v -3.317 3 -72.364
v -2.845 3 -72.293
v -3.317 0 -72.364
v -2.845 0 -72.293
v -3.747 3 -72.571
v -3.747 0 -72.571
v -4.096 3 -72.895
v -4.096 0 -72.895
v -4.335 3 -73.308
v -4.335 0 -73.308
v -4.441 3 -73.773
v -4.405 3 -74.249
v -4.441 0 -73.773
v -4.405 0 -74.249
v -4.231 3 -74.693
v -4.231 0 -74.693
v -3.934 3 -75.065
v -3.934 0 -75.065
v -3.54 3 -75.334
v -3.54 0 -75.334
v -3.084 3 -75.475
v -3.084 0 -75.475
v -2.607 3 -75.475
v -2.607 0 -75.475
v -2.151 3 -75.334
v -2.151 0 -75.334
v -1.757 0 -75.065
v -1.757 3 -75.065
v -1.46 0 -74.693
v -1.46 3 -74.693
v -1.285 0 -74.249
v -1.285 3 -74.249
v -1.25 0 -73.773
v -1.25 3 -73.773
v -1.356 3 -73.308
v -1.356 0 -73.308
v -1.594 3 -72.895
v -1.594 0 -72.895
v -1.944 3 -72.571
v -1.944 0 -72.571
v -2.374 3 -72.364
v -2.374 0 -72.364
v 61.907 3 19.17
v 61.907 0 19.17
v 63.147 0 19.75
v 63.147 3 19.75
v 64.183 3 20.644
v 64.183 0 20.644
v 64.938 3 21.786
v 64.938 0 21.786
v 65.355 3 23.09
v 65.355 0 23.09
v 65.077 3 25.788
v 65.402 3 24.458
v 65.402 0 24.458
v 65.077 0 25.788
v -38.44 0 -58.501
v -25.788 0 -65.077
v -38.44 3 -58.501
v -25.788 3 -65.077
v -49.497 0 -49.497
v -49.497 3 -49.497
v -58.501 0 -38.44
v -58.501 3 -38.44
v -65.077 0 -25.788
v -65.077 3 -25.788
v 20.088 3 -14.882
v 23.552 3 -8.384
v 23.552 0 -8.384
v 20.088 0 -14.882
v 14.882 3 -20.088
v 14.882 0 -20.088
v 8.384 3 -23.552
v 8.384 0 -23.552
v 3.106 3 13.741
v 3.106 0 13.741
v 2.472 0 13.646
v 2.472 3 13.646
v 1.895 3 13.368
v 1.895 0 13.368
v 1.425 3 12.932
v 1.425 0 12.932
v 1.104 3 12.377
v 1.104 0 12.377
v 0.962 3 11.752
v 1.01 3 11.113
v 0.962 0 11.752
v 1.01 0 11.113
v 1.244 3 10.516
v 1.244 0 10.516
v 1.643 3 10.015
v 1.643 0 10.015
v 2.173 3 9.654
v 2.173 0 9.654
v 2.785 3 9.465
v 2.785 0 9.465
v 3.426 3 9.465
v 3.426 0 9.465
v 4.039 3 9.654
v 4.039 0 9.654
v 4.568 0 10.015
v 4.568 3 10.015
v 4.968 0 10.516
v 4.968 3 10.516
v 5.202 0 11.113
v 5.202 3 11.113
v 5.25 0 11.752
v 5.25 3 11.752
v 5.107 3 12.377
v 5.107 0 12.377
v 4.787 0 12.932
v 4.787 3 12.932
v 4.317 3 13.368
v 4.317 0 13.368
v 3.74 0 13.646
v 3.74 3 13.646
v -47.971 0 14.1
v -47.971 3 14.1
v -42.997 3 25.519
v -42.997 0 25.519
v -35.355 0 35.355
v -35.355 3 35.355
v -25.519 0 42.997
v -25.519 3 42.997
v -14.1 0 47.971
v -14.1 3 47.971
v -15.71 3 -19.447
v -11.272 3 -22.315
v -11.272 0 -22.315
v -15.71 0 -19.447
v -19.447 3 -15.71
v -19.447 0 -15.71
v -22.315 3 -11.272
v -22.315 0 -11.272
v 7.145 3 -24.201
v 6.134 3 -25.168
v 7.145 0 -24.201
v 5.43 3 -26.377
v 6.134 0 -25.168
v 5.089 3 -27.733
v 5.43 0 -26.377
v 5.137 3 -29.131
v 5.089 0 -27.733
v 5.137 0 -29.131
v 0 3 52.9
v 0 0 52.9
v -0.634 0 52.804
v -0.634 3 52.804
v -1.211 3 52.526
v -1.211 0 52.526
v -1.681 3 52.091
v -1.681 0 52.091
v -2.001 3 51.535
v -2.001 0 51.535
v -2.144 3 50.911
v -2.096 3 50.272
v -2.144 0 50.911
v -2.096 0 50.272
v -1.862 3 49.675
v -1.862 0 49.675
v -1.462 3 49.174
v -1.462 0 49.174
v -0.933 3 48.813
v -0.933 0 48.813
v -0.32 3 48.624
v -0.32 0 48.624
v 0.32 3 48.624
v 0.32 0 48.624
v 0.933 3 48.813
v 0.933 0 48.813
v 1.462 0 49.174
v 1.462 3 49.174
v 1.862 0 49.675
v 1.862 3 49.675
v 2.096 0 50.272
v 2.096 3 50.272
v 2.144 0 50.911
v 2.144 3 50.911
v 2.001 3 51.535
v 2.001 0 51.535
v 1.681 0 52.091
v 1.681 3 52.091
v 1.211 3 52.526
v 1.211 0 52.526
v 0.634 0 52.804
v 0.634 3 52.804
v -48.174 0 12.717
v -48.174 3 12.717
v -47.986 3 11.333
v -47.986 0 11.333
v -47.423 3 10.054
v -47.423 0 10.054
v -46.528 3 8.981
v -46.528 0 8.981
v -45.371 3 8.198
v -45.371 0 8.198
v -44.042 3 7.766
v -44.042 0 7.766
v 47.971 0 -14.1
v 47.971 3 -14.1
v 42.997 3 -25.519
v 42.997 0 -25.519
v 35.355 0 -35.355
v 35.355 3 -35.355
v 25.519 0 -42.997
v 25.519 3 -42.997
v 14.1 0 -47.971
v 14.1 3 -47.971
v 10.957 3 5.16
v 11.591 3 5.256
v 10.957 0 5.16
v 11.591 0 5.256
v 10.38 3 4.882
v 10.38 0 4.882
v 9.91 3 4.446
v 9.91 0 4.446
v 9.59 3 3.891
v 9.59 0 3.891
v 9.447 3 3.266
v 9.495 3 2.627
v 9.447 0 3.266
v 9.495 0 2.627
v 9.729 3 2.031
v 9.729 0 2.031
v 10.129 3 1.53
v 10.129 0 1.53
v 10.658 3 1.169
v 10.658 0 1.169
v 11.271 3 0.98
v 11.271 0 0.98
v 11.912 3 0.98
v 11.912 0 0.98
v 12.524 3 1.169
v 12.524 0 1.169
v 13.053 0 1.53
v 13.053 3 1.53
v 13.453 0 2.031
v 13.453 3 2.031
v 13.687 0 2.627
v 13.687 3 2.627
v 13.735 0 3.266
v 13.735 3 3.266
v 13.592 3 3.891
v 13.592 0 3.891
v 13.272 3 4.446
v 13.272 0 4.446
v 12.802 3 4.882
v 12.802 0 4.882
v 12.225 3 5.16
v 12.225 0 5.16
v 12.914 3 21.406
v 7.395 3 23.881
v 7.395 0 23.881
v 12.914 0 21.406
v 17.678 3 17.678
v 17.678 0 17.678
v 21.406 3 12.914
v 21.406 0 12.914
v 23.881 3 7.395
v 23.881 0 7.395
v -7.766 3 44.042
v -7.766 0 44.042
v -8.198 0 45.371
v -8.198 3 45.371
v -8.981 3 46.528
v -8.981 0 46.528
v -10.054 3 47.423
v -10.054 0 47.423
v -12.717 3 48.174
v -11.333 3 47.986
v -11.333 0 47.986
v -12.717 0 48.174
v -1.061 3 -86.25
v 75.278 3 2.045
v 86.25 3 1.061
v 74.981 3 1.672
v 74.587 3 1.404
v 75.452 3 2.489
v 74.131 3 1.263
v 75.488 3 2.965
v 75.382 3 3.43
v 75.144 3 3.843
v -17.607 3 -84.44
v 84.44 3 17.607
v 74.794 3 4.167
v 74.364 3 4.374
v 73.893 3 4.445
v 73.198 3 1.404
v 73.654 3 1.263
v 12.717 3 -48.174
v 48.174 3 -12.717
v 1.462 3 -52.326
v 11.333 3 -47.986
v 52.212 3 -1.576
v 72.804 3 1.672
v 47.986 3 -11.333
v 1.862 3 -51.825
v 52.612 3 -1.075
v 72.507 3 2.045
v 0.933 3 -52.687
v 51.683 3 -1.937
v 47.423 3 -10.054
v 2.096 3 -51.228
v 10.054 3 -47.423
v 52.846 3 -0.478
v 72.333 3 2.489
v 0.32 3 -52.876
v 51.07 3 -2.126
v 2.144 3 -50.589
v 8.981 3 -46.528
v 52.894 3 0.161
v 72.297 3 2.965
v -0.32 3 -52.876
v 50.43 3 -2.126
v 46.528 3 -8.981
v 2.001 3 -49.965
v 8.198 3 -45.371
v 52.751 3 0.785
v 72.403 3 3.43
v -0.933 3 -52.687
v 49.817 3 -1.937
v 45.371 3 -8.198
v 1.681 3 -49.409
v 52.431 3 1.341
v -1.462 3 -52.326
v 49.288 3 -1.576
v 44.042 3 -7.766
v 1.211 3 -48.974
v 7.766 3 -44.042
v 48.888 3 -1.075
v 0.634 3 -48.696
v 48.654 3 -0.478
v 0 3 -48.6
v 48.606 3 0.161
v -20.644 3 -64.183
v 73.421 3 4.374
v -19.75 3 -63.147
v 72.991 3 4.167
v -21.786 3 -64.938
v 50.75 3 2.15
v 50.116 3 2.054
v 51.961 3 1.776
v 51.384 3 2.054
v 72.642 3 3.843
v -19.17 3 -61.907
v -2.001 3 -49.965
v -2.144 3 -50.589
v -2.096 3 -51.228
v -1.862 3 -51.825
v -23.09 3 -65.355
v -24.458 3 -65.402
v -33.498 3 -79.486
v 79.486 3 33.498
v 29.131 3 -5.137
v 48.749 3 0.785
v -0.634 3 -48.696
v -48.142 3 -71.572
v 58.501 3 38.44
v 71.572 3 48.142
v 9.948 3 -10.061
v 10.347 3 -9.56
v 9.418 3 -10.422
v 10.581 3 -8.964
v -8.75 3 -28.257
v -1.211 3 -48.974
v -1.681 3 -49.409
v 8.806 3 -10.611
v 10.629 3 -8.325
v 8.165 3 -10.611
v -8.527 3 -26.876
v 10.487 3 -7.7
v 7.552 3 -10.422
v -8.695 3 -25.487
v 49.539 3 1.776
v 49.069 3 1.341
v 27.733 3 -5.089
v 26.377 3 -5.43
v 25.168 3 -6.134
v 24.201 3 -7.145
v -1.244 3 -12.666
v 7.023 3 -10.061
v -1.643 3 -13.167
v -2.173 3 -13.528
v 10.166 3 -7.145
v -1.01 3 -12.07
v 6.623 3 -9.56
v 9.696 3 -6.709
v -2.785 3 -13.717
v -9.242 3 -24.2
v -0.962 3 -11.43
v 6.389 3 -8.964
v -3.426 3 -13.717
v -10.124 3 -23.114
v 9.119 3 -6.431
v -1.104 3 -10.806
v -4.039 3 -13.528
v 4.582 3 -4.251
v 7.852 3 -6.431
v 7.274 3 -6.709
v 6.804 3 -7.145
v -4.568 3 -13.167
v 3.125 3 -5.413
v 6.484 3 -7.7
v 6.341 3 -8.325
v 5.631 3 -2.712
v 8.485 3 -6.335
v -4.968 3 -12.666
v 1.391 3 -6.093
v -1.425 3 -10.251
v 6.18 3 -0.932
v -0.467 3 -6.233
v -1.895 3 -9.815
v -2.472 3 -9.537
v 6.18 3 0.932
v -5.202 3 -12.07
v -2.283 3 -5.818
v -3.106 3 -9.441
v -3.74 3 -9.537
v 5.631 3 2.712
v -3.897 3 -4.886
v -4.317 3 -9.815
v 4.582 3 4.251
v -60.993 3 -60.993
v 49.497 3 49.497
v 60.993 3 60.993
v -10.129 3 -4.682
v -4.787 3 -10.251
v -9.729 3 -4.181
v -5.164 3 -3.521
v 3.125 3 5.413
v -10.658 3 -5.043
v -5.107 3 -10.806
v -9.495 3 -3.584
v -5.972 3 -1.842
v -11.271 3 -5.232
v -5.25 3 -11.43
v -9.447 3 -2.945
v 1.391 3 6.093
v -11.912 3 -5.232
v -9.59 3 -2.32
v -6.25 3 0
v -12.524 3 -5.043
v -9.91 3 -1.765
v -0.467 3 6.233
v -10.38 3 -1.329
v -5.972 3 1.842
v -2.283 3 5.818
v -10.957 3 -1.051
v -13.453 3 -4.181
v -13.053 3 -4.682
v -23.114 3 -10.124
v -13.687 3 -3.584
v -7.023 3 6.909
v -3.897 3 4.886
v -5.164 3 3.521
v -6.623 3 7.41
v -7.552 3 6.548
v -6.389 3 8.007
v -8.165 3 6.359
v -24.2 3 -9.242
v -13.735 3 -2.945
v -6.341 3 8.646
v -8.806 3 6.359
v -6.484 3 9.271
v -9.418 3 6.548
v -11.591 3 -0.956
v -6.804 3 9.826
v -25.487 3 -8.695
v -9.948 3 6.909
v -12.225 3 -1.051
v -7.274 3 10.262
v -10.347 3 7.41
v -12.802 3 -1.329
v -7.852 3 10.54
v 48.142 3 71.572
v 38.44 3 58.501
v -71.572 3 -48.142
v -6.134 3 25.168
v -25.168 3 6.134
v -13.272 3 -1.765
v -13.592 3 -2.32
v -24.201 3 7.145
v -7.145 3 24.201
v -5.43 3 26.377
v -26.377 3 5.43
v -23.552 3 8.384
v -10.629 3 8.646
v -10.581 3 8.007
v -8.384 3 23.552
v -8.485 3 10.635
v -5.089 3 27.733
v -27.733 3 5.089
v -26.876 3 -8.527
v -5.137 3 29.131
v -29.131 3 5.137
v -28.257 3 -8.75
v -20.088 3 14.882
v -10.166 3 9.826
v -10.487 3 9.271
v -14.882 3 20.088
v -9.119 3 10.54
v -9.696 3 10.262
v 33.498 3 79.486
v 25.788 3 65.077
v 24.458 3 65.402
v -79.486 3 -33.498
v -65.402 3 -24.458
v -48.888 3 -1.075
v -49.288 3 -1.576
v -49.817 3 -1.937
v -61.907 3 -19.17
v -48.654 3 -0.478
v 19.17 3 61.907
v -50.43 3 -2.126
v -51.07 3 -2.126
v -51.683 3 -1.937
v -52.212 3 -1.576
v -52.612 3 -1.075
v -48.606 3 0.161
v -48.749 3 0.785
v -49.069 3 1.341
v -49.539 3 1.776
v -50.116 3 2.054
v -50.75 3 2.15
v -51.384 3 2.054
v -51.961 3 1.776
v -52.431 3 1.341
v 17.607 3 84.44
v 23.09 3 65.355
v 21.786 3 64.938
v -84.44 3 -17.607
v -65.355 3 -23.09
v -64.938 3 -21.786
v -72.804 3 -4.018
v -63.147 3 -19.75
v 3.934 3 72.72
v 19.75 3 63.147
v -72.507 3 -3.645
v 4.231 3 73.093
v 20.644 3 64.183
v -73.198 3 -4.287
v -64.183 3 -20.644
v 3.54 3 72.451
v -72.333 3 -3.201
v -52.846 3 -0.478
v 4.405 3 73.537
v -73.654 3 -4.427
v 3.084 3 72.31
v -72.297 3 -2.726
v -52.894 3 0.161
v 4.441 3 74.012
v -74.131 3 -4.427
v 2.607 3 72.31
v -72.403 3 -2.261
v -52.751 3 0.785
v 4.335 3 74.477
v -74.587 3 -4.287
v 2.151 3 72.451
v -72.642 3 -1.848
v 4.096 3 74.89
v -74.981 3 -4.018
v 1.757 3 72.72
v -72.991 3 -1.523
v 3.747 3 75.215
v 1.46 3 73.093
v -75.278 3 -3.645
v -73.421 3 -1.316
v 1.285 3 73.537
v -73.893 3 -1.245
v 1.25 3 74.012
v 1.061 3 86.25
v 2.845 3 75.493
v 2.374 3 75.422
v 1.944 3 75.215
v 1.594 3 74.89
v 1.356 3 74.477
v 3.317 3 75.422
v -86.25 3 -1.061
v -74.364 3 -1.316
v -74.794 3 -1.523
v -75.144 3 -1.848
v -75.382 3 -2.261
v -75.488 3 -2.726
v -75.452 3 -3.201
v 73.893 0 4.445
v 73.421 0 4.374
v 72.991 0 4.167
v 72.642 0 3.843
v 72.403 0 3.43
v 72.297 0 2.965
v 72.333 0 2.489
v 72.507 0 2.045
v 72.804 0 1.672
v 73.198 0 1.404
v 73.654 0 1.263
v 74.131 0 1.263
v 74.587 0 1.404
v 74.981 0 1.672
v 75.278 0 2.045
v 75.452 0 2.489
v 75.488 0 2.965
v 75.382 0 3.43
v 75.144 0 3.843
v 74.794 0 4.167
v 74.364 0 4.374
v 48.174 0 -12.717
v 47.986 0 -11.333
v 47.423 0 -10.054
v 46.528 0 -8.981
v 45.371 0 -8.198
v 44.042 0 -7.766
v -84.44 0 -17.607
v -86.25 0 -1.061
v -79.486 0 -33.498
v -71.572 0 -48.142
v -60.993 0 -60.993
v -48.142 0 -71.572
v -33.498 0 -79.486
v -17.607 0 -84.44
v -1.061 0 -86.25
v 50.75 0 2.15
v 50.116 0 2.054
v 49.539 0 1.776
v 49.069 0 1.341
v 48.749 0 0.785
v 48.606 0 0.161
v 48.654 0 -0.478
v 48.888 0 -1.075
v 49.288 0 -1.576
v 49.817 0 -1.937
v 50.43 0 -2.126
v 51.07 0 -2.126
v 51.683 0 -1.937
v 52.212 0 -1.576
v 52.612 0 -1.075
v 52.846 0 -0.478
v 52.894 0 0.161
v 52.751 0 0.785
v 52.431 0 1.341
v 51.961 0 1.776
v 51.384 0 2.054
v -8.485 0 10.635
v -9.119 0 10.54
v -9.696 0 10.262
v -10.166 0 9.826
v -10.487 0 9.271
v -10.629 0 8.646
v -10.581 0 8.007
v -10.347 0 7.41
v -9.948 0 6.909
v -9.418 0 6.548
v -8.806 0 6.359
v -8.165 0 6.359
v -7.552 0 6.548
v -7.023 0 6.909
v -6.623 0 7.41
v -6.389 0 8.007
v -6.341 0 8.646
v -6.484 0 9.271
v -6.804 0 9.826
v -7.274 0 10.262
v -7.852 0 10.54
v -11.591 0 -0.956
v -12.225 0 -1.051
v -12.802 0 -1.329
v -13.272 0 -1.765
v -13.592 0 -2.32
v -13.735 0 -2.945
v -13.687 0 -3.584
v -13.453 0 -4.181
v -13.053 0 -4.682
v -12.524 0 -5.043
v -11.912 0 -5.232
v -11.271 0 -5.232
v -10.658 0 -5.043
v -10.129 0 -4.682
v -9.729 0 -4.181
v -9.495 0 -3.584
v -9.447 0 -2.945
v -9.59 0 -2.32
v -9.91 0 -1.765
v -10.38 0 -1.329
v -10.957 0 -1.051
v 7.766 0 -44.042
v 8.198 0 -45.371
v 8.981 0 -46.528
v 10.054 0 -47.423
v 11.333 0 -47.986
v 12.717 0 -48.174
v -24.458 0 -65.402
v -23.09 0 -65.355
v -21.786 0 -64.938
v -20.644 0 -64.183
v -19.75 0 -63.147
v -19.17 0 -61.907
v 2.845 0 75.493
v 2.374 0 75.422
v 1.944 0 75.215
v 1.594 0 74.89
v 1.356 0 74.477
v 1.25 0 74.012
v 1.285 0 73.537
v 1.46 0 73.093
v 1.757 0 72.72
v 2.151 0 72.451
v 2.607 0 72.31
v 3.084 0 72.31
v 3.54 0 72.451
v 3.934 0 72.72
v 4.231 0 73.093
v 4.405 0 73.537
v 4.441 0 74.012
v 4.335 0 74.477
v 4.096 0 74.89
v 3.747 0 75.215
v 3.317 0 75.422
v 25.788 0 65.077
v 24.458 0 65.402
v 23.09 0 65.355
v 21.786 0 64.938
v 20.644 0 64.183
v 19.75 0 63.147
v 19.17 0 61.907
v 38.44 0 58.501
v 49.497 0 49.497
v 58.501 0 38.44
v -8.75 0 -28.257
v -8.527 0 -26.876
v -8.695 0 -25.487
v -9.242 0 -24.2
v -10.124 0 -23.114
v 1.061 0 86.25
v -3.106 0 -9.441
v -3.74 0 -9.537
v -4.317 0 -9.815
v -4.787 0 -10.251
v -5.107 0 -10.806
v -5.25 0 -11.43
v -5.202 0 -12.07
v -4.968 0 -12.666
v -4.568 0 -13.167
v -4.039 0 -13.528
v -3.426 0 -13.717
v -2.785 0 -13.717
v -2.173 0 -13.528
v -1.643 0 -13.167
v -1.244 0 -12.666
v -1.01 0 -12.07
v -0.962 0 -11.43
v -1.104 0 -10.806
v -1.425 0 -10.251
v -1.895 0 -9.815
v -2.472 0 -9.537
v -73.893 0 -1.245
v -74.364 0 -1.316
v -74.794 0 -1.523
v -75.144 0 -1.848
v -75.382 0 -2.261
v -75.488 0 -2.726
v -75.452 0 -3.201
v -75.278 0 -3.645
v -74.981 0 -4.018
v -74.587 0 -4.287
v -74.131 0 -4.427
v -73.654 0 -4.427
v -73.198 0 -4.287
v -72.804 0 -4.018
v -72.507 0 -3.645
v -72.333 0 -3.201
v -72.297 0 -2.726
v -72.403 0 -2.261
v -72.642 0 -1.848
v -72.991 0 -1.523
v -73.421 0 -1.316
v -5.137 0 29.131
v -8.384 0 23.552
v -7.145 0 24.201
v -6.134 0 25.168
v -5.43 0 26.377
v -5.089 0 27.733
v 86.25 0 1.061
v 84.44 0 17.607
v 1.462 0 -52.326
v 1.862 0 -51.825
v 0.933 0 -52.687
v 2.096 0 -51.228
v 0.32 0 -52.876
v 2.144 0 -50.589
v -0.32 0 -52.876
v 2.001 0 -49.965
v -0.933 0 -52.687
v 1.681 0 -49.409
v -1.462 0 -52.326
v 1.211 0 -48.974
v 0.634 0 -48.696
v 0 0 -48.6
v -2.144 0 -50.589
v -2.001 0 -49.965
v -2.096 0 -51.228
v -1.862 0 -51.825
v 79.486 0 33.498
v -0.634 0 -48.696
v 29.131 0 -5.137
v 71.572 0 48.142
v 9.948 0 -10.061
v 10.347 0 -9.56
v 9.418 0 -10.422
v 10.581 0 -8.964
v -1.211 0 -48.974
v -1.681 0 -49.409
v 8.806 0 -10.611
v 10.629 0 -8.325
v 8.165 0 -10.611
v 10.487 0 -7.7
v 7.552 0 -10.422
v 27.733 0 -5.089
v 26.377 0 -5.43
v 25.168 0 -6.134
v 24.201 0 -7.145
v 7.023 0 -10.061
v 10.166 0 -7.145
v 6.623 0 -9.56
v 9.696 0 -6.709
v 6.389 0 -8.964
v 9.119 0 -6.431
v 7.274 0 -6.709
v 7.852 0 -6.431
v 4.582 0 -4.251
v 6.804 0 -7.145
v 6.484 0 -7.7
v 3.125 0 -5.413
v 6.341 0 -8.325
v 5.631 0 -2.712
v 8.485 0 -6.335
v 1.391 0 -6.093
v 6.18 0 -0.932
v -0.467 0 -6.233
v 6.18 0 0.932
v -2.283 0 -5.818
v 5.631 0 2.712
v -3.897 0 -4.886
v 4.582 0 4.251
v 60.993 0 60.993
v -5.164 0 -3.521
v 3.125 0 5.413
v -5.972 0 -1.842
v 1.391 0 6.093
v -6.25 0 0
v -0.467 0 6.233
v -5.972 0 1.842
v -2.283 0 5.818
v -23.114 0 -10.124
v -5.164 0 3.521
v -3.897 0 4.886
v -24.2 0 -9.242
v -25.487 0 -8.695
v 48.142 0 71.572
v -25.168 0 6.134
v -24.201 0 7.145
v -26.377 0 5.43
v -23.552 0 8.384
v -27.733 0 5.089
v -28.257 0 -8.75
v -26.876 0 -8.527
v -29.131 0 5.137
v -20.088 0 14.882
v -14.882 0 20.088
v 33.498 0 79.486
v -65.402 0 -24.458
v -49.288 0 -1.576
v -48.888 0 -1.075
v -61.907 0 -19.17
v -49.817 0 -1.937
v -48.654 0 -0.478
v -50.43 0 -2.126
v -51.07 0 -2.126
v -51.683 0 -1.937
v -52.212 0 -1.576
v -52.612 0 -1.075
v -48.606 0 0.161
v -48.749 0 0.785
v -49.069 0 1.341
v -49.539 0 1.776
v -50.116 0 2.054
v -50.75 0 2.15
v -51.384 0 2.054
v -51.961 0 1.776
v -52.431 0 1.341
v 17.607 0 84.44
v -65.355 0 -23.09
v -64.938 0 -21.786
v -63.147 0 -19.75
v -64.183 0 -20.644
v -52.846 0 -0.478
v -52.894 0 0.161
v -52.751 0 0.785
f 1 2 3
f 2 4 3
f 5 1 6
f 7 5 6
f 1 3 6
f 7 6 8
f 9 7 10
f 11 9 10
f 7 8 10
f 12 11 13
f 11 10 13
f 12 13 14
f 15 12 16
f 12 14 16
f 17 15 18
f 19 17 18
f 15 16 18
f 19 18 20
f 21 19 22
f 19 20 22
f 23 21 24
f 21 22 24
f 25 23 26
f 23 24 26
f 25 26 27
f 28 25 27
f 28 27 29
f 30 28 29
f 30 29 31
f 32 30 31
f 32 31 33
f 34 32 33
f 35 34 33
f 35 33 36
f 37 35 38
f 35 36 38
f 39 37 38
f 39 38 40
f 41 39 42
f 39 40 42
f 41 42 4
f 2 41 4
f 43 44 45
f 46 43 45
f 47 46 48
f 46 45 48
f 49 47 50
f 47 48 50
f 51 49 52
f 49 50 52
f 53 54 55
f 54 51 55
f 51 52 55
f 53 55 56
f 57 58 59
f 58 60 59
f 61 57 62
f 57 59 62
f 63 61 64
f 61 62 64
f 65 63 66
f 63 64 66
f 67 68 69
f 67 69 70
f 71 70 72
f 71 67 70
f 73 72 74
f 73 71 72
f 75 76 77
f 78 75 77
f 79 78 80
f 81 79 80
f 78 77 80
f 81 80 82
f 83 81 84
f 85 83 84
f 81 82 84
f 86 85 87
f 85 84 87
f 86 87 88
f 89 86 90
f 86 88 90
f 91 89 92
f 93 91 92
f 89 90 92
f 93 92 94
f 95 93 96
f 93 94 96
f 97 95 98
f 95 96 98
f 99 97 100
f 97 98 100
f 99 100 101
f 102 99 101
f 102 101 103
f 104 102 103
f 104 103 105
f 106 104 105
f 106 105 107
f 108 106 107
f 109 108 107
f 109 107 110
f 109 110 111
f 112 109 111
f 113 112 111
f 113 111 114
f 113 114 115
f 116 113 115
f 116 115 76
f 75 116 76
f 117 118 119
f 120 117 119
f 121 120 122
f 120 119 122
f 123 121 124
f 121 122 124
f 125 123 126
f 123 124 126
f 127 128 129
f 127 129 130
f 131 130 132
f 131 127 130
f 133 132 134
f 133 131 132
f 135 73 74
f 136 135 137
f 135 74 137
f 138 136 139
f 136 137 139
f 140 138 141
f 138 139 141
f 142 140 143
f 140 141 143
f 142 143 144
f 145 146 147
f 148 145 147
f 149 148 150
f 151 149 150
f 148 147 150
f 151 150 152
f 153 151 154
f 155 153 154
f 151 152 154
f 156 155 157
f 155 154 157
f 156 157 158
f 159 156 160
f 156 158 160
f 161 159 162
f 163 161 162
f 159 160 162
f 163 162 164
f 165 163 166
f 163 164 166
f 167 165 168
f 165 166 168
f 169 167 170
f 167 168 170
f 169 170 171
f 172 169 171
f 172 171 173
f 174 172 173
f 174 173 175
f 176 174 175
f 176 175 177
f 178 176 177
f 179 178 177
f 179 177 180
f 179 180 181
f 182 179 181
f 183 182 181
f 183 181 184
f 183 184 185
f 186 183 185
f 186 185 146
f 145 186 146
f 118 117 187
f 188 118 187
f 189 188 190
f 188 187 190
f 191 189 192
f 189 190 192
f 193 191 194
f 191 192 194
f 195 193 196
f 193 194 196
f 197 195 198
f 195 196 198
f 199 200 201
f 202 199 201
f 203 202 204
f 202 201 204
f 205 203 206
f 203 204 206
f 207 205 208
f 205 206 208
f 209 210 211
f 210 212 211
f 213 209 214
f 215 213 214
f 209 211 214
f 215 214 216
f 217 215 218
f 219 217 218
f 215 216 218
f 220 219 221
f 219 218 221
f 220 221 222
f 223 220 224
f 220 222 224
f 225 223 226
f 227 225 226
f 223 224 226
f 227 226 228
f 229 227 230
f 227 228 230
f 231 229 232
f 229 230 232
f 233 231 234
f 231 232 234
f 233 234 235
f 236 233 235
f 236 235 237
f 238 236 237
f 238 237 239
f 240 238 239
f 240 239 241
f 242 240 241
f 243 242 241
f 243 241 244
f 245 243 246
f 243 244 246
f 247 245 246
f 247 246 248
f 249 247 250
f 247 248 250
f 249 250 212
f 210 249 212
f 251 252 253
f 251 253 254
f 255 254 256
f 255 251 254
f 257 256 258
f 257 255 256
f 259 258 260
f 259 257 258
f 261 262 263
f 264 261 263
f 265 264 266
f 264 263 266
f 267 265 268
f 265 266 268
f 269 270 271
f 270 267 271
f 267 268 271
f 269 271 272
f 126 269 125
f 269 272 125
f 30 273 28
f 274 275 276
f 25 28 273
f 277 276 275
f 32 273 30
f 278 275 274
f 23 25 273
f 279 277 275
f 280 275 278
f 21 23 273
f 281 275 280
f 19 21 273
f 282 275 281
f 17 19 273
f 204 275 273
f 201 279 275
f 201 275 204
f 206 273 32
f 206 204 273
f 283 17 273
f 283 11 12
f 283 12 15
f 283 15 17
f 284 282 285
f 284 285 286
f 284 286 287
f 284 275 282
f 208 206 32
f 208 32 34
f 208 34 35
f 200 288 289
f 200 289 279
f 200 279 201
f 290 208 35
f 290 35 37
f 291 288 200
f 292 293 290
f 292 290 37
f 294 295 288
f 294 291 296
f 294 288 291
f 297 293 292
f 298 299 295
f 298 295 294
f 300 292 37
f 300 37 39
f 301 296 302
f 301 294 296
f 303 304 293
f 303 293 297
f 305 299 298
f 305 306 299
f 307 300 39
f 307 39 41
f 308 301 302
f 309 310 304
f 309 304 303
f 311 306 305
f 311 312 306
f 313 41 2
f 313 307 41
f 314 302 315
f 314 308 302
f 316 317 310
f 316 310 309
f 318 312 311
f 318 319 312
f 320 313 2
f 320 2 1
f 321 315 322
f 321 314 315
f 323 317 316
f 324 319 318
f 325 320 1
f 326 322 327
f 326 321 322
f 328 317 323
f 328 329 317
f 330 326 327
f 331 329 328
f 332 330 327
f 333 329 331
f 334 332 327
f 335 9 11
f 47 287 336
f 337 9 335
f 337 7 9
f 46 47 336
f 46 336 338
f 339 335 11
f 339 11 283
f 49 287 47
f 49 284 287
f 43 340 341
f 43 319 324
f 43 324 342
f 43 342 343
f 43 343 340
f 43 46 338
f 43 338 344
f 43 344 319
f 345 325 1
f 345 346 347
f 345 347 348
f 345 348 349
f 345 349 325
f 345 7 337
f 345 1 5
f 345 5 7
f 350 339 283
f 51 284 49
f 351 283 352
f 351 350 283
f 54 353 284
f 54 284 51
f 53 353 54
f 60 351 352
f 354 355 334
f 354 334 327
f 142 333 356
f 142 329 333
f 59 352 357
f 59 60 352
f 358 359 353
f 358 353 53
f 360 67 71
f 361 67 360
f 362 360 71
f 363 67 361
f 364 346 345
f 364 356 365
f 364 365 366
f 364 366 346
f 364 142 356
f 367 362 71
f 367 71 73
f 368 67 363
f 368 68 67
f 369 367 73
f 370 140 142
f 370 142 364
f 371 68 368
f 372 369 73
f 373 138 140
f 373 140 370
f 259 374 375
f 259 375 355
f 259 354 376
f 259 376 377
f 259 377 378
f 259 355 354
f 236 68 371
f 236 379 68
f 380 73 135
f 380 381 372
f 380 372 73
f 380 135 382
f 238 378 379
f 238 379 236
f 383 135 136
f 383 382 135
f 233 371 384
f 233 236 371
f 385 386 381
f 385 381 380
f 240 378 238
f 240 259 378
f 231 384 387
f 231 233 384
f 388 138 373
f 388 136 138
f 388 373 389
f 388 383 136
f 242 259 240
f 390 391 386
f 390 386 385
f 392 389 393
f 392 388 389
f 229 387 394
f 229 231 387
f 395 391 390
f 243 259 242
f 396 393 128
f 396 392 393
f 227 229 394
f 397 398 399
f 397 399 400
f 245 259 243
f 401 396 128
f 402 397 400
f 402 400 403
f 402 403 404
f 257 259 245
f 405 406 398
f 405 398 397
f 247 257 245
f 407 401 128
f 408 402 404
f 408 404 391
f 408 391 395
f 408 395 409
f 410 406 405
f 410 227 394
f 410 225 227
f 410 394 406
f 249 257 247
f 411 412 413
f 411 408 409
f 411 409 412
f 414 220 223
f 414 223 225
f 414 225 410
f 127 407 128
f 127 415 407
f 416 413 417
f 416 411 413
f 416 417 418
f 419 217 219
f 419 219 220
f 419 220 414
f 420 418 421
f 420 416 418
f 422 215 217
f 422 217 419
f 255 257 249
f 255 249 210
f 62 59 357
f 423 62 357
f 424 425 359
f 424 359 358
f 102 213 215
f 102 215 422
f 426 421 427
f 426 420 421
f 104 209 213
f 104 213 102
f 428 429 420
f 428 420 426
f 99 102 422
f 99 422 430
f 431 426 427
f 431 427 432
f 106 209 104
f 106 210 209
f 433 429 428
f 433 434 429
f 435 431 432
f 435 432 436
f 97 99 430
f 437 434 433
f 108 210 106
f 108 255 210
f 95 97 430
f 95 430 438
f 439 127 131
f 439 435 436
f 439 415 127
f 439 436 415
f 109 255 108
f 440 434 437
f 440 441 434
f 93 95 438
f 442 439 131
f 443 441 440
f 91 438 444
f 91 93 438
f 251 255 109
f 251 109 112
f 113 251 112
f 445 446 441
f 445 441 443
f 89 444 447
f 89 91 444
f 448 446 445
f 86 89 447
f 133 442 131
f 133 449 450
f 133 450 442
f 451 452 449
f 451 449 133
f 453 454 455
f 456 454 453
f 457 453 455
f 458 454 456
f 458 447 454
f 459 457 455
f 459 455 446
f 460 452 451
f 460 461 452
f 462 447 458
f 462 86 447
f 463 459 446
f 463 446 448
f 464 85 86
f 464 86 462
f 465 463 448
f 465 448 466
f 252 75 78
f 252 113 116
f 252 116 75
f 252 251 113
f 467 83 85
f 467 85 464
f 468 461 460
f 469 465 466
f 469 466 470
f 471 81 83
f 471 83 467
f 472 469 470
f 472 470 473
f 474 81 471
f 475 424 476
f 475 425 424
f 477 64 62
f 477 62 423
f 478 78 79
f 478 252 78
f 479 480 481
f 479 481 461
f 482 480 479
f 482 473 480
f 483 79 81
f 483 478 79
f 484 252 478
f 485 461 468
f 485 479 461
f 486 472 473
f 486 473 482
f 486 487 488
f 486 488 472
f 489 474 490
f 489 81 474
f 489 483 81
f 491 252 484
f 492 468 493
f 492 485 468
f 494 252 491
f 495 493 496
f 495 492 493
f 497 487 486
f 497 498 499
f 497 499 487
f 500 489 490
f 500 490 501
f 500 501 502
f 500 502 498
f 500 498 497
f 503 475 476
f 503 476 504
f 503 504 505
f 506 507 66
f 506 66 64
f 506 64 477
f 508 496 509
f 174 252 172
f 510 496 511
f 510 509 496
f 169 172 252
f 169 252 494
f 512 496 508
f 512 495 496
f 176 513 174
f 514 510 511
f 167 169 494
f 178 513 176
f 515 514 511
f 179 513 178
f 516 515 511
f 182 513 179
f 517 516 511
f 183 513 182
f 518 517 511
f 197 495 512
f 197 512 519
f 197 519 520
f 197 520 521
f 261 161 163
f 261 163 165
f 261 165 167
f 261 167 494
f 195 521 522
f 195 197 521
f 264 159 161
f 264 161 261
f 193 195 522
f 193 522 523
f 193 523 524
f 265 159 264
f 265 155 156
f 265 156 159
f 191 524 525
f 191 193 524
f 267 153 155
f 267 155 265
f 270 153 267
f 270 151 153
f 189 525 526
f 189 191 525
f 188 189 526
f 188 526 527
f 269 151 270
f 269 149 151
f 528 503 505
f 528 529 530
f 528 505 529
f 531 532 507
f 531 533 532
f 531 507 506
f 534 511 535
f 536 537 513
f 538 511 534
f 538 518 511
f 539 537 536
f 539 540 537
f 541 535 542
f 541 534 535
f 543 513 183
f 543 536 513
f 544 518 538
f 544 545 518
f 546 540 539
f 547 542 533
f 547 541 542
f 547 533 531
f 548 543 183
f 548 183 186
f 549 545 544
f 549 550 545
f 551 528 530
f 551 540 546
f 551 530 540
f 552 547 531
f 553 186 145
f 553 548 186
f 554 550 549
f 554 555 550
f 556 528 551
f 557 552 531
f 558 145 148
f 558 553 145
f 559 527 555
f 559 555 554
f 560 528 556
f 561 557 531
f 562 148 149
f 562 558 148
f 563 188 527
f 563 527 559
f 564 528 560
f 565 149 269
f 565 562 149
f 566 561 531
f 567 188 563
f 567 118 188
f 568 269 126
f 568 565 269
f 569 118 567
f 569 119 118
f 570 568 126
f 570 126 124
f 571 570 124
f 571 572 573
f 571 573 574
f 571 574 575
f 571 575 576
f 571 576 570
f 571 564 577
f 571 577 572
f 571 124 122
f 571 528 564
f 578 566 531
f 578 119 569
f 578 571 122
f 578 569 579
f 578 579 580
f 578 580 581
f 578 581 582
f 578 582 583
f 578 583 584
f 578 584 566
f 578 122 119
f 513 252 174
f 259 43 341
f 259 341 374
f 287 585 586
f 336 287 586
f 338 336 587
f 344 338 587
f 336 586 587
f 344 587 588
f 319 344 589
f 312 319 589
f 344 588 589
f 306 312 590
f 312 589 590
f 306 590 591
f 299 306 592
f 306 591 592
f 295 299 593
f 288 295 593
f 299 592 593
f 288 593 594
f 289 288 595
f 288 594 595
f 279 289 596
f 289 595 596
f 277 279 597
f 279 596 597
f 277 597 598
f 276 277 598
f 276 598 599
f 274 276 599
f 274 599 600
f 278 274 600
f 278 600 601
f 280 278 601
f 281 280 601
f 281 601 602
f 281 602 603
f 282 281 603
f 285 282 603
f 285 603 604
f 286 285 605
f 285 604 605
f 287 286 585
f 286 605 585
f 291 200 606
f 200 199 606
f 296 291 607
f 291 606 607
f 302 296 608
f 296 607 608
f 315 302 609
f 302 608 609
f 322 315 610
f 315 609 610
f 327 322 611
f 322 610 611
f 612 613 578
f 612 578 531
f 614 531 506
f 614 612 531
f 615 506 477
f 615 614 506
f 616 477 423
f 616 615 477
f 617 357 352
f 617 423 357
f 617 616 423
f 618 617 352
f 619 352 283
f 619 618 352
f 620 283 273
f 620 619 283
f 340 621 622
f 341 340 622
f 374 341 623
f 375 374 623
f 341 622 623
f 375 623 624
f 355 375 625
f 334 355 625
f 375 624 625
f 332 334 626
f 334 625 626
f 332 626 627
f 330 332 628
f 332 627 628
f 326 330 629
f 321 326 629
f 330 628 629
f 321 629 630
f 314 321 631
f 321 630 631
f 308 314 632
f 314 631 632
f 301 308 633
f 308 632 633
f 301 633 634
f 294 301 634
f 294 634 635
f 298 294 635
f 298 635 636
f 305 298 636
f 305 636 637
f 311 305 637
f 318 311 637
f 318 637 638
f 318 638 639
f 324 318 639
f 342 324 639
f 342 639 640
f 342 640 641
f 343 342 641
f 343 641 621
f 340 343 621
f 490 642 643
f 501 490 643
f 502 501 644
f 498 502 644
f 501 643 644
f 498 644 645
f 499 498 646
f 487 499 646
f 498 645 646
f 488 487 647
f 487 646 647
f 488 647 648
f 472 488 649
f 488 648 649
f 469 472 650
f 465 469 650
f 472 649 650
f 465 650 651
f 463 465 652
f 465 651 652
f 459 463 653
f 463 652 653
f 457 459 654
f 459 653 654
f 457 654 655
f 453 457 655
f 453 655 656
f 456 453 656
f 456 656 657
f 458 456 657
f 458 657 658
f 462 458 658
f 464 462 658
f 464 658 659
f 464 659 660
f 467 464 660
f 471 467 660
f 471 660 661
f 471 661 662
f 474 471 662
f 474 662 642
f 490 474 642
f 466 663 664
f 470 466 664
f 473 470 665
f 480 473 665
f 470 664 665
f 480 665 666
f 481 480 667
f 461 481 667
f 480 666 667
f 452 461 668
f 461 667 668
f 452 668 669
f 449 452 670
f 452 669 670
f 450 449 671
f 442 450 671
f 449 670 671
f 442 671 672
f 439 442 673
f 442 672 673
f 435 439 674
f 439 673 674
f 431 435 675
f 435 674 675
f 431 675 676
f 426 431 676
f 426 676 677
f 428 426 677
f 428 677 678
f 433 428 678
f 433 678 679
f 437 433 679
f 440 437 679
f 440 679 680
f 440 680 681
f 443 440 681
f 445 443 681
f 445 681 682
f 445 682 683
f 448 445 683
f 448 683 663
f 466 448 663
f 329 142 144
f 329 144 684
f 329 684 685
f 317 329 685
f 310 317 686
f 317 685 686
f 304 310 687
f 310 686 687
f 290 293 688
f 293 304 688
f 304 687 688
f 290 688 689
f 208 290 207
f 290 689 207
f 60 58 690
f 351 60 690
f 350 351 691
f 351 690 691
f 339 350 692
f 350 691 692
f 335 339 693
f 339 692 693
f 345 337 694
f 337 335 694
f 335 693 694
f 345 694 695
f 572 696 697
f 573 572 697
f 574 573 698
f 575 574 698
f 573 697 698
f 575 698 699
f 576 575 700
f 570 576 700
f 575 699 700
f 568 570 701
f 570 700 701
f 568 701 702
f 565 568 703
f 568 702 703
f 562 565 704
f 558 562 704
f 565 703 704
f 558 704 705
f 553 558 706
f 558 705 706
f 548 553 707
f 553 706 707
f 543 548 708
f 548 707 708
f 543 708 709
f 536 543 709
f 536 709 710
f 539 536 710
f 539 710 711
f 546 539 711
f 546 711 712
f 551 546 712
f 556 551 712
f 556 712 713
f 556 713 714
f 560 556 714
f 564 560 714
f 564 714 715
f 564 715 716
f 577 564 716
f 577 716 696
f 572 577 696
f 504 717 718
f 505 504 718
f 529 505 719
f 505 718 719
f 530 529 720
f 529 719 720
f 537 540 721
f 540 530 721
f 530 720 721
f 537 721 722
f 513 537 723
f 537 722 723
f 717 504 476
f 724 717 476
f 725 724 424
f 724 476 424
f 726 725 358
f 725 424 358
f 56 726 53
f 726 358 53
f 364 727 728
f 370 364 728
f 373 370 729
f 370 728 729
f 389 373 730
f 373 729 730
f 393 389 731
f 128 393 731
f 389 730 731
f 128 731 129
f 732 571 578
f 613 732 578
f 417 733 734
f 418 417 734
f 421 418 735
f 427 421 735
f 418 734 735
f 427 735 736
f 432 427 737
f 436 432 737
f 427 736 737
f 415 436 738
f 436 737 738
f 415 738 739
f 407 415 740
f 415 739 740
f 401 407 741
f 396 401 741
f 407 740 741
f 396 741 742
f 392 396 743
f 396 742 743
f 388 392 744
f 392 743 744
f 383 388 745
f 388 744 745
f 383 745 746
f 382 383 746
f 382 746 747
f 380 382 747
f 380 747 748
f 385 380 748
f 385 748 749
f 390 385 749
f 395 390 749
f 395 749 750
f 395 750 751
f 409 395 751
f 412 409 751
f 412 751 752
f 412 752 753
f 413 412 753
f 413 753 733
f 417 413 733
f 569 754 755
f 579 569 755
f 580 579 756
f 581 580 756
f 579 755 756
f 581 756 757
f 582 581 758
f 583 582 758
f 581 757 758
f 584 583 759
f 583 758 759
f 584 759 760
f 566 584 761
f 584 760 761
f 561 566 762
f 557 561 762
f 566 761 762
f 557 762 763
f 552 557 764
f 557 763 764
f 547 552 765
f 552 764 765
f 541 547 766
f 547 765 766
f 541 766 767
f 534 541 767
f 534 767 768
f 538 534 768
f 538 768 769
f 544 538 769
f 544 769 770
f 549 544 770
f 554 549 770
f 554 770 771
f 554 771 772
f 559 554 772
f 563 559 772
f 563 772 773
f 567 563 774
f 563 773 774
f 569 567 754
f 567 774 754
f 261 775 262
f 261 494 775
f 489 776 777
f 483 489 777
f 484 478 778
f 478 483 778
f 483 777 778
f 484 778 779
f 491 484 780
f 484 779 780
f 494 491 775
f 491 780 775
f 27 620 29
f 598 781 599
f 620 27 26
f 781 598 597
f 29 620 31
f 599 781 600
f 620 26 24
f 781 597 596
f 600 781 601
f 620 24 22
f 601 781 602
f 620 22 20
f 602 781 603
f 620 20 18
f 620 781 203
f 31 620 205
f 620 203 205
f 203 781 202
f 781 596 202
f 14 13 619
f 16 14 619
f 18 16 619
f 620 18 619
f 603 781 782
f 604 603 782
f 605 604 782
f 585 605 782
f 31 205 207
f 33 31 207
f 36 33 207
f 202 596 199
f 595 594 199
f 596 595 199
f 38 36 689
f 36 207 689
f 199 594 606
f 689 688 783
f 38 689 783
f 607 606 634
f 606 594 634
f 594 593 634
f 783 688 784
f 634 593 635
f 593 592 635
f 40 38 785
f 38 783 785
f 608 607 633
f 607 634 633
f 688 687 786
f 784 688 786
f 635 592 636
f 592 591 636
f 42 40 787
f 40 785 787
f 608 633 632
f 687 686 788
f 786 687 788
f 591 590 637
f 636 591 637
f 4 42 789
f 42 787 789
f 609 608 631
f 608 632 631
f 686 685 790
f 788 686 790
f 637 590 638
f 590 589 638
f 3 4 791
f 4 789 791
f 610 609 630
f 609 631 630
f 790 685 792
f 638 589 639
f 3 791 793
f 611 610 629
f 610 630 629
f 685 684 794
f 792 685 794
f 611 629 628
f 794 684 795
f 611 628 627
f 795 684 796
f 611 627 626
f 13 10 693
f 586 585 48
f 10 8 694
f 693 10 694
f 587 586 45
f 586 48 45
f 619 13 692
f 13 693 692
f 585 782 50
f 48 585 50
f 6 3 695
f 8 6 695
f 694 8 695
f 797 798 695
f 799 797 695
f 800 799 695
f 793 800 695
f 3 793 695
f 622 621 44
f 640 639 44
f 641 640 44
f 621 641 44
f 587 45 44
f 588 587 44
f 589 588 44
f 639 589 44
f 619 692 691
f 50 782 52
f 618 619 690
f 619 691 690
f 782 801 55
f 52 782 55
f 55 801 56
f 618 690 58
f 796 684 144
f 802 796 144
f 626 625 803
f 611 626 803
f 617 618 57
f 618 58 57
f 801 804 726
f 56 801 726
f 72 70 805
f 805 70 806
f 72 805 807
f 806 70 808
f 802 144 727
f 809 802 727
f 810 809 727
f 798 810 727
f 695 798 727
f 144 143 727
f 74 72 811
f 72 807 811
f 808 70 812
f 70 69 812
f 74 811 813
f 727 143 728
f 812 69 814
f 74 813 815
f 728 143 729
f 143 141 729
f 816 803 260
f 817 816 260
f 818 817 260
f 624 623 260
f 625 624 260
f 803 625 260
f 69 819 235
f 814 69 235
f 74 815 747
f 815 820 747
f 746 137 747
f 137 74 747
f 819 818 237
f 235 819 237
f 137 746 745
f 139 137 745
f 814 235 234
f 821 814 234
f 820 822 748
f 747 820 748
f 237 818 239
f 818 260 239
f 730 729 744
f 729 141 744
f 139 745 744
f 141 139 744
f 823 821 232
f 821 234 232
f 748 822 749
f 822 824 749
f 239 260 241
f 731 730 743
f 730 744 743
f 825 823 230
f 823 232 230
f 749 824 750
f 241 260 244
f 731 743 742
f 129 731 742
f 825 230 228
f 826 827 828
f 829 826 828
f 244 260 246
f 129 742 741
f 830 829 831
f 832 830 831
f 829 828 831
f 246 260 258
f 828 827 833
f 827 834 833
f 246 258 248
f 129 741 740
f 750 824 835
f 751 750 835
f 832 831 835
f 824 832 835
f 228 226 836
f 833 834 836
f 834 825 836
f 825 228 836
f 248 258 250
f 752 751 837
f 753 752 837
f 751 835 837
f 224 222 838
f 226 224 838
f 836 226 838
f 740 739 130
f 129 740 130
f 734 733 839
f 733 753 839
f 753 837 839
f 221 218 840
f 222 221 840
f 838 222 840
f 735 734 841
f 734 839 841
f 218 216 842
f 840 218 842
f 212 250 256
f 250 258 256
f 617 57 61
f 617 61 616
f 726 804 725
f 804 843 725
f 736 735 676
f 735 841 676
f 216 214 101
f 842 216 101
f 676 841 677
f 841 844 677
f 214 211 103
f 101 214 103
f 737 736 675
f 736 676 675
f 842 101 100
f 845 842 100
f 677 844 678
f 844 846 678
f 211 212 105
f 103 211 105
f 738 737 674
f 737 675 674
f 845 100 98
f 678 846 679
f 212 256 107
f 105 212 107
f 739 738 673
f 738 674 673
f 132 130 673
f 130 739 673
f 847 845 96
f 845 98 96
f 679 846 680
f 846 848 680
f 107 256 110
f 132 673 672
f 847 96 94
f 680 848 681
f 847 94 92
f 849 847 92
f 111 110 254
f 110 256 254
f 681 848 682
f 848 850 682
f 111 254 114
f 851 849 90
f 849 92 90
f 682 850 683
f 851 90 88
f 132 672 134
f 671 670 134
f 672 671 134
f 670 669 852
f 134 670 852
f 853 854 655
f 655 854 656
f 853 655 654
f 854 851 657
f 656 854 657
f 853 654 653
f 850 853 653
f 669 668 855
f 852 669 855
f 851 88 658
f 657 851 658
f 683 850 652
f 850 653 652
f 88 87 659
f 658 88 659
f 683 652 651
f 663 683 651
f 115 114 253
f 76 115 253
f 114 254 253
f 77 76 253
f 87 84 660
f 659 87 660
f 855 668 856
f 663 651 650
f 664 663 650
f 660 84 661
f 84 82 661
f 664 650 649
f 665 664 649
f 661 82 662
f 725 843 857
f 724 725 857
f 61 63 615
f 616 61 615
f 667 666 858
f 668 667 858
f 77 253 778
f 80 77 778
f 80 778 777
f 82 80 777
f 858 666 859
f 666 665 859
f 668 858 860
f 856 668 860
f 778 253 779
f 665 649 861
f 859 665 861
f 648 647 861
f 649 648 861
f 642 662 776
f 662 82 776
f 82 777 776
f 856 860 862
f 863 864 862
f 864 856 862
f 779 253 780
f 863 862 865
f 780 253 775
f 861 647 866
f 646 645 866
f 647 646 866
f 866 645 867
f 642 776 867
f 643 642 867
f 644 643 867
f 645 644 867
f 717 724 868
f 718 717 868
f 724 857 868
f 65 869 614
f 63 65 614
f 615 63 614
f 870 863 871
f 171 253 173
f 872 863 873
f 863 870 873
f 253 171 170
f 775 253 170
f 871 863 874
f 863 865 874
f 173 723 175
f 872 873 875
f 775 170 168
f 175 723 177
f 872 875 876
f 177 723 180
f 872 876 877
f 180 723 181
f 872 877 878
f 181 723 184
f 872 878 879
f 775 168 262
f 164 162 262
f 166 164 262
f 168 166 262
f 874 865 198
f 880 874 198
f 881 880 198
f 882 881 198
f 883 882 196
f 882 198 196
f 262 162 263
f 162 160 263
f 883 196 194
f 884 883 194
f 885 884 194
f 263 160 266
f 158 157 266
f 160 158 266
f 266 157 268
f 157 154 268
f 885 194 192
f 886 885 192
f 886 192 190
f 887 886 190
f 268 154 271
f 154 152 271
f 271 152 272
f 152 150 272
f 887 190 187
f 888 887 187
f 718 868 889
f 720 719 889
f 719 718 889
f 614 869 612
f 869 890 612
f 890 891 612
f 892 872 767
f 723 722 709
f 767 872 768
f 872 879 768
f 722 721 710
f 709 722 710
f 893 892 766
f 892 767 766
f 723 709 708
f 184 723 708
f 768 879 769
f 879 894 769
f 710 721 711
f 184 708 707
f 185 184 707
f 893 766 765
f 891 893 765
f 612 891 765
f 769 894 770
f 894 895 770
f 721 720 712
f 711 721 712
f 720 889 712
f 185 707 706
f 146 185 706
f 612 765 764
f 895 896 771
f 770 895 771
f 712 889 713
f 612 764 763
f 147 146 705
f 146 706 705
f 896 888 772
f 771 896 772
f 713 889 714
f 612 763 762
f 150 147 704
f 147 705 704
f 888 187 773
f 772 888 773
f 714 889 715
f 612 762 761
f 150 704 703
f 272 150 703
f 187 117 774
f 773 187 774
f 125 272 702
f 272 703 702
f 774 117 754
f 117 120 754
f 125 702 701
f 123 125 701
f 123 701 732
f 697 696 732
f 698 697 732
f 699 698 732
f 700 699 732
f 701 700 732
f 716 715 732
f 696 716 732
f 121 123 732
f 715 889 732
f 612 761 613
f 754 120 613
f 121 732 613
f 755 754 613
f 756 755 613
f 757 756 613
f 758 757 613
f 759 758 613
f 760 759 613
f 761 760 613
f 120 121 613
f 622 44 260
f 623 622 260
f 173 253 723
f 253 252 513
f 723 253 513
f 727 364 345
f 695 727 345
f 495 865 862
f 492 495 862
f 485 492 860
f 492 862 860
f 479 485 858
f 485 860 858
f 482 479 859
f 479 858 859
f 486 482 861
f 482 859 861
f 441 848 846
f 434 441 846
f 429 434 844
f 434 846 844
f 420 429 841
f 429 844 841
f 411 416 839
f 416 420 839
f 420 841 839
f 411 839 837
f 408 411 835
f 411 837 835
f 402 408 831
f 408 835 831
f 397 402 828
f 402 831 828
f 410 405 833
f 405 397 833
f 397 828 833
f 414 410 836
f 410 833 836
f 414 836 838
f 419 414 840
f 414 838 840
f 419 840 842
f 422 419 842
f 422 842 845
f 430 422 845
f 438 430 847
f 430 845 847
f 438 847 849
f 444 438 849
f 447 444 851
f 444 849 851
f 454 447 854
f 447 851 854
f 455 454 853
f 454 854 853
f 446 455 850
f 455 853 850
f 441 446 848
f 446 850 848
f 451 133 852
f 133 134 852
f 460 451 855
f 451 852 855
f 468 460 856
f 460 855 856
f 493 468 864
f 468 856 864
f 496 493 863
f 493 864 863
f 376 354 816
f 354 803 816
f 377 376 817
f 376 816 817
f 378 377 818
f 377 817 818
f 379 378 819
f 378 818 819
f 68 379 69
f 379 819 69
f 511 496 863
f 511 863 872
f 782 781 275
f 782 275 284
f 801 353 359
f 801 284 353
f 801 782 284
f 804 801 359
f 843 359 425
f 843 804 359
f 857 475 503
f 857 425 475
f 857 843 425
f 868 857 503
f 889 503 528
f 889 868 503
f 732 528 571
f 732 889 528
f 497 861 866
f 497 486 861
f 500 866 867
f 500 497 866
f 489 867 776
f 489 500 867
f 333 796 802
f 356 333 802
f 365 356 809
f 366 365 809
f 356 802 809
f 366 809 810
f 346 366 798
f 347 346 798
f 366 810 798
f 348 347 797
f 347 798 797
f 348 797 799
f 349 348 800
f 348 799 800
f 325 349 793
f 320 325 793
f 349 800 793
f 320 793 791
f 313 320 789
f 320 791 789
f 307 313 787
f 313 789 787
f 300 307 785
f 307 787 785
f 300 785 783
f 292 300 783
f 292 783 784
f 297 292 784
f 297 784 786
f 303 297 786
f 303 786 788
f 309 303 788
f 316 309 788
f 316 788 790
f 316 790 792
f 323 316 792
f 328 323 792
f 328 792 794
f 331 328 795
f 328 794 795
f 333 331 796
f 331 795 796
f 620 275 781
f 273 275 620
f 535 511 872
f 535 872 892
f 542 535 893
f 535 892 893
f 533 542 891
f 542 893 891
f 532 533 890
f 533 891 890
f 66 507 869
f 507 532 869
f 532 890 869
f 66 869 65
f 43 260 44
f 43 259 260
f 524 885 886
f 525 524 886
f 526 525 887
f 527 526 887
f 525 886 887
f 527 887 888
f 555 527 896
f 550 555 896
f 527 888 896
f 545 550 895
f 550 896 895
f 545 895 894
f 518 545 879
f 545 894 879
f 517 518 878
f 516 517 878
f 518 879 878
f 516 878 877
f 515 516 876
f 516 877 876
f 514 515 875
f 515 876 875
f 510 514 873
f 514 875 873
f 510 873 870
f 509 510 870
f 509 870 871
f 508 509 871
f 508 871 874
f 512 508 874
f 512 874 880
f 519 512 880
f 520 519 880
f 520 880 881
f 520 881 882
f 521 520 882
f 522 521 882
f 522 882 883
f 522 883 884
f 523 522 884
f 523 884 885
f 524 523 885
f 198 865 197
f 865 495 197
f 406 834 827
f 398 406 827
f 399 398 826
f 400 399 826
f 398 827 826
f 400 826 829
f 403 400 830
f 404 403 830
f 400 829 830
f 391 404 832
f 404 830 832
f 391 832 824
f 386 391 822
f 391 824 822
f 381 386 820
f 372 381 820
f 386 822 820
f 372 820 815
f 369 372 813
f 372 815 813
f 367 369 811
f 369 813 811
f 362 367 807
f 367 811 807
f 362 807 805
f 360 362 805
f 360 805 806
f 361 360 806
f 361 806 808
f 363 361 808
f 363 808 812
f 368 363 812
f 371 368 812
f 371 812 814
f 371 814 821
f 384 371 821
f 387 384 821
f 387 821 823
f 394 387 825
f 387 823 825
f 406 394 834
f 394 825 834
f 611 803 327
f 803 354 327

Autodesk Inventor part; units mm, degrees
ref_plane "YZ Plane" through (0, 0, 0) normal (1, 0, 0) x (0, 1, 0)
ref_plane "XZ Plane" through (0, 0, 0) normal (0, 1, 0) x (-1, 0, 0)
ref_plane "XY Plane" through (0, 0, 0) normal (0, 0, 1) x (1, 0, 0)
sketch "スケッチ1" plane through (0, 0, 0) normal (0, 1, 0) x (-1, 0, 0)
  circle A0 centre (0, 0) radius 86.2565
  circle A1 centre (0, 0) radius 6.25
  dimension "d0" = 172.513
  dimension "d1" = 12.5
extrude "押し出し1" add sketch "スケッチ1" along normal blind 3
sketch "スケッチ2" plane through (0, 3, 0) normal (0, 1, 0) x (1, 0, 0)
  circle A0 centre (0, 0) radius 50.75
  point P0 (0, 50.75)
  point P1 (-50.75, 0)
  point P2 (0, -50.75)
  point P3 (50.75, 0)
  dimension "d4" = 101.5
  dimension "d7" = 360
hole "穴1" at (0, 3, -50.75) at (-50.75, 3, 0) at (0, 3, 50.75) at (50.75, 3, 0) direction (0, -1, 0) diameter 4.3 end through all
sketch "スケッチ3" plane through (0, 3, 0) normal (0, 1, 0) x (1, 0, 0)
  line L0 (0, 0) -> (86.2565, 0)
  circle A0 centre (0, 0) radius 86.2565 projected
  circle A1 centre (0, 0) radius 6.25 projected
  line L1 (0, 0) -> (60.9926, -60.9926)
  line L2 (1.0606, -86.25) -> (-86.25, 1.0606)
  line L3 (86.25, -1.0606) -> (-1.0606, 86.25)
  point P0 (-1.0606, 86.25)
  point P1 (85.1894, 0)
  point P2 (86.25, -1.0606)
  dimension "d16" = 45
  dimension "d17" = 60.238
extrude "押し出し2" cut sketch "スケッチ3" against normal blind 3 contours L3 A0 L0 | L0 A0 L3 | A0 L2
sketch "スケッチ4" plane through (0, 3, 0) normal (0, 1, 0) x (1, 0, 0)
  circle A0 centre (0, 0) radius 6.25 projected
  circle A1 centre (0, 0) radius 12
  line L0 (0, 0) -> (-8.4853, -8.4853)
  line L1 (0, 0) -> (-12, 0)
  point P0 (3.1058, -11.5911)
  point P1 (11.5911, -3.1058)
  point P2 (8.4853, 8.4853)
  point P3 (-3.1058, 11.5911)
  point P4 (-11.5911, 3.1058)
  dimension "d20" = 24
  dimension "d21" = 45
  dimension "d24" = 360
hole "穴2" at (-8.4853, 3, 8.4853) at (3.1058, 3, 11.5911) at (11.5911, 3, 3.1058) at (8.4853, 3, -8.4853) at (-3.1058, 3, -11.5911) at (-11.5911, 3, -3.1058) direction (0, -1, 0) diameter 4.3 end through all
sketch "スケッチ5" plane through (0, 3, 0) normal (0, 1, 0) x (1, 0, 0)
  arc A0 (1.0606, -86.25) -> (86.25, -1.0606) centre (0, 0) ccw projected
  line L0 (14.0562, -85.1035) -> (-85.1035, 14.0562)
  arc A1 (-1.0606, 86.25) -> (-86.25, 1.0606) centre (0, 0) ccw projected
  line L1 (-86.25, 1.0606) -> (1.0606, -86.25) projected
  line L2 (-14.0562, 85.1035) -> (85.1035, -14.0562)
  line L3 (86.25, -1.0606) -> (-1.0606, 86.25) projected
  line L4 (-86.25, 1.0606) -> (-1.0606, 86.25)
  line L5 (1.0606, -86.25) -> (86.25, -1.0606)
  line L6 (-73.8926, 2.8453) -> (-2.8453, 73.8926)
  line L7 (80.9636, 4.2257) -> (2.8453, -73.8926)
  point P0 (73.8926, -2.8453)
  dimension "d33" = 10
  dimension "d34" = 10
  dimension "d35" = 7.476
  dimension "d36" = 7.476
hole "穴3" at (-73.8926, 3, -2.8453) at (-2.8453, 3, -73.8926) at (73.8926, 3, 2.8453) at (2.8453, 3, 73.8926) direction (0, -1, 0) diameter 3.2 end through all
sketch "スケッチ6" plane through (0, 3, 0) normal (0, 1, 0) x (1, 0, 0)
  circle A0 centre (0, 0) radius 6.25 projected
  circle A1 centre (0, 0) radius 70
  circle A2 centre (0, 0) radius 50
  circle A3 centre (-2.8453, 73.8926) radius 1.6 projected
  line L0 (0, 0) -> (-2.8453, 73.8926)
  circle A4 centre (-73.8926, 2.8453) radius 1.6 projected
  line L1 (0, 0) -> (-73.8926, 2.8453)
  line L2 (0, 0) -> (-20.7056, 66.8676)
  line L3 (0, 0) -> (-66.8676, 20.7056)
  circle A5 centre (0, 0) radius 25
  circle A6 centre (0, 50.75) radius 2.15 projected
  line L4 (0, 0) -> (0, 50.75)
  line L5 (0, 0) -> (8.6824, 49.2404)
  line L6 (0, 0) -> (49.2404, 8.6824)
  circle A7 centre (50.75, 0) radius 2.15 projected
  line L7 (0, 0) -> (50.75, 0)
  line L8 (0, 0) -> (-49.2404, -8.6824)
  line L9 (0, 0) -> (-8.6824, -49.2404)
  line L10 (0, 0) -> (20.7056, -66.8676)
  line L11 (0, 0) -> (66.8676, -20.7056)
  circle A8 centre (0, 0) radius 40
  point P0 (-4.3412, -24.6202)
  point P1 (-24.6202, -4.3412)
  point P2 (47.7626, -14.7897)
  point P3 (23.8813, -7.3948)
  point P4 (7.3948, -23.8813)
  point P5 (14.7897, -47.7626)
  point P6 (24.6202, 4.3412)
  point P7 (4.3412, 24.6202)
  point P8 (-23.8813, 7.3948)
  point P9 (-7.3948, 23.8813)
  point P10 (-14.7897, 47.7626)
  point P11 (-47.7626, 14.7897)
  point P12 (66.8676, -20.7056)
  point P13 (20.7056, -66.8676)
  point P14 (38.2101, -11.8318)
  point P15 (11.8318, -38.2101)
  point P16 (-38.2101, 11.8318)
  point P17 (-11.8318, 38.2101)
  dimension "d44" = 140
  dimension "d45" = 100
  dimension "d46" = 15
  dimension "d47" = 15
  dimension "d48" = 50
  dimension "d49" = 10
  dimension "d50" = 10
  dimension "d53" = 360
  dimension "d57" = 80
extrude "押し出し3" cut sketch "スケッチ6" against normal blind 10 contours A5 L5 A8 L6 | L11 A8 L10 A5 | A8 L5 A2 L6 | L11 A2 L10 A8 | A5 L3 A8 L2 | A5 L9 A8 L8 | L11 A1 L10 A2 | A8 L3 A2 L2 | A8 L9 A2 L8 | A2 L3 A1 L2
fillet "フィレット1" radius 5 14 edges at (-20.7056, 1.5, -66.8676) (-66.8676, 1.5, -20.7056) (-49.2404, 1.5, 8.6824) (-24.6202, 1.5, 4.3412) (-8.6824, 1.5, 49.2404) (-4.3412, 1.5, 24.6202) (20.7056, 1.5, 66.8676) (66.8676, 1.5, 20.7056) (24.6202, 1.5, -4.3412) (49.2404, 1.5, -8.6824) (8.6824, 1.5, -49.2404) (4.3412, 1.5, -24.6202) (-7.3948, 1.5, -23.8813) (-23.8813, 1.5, -7.3948)
properties part number "baseplate_R2toR3" material "アルミニウム 6061"
